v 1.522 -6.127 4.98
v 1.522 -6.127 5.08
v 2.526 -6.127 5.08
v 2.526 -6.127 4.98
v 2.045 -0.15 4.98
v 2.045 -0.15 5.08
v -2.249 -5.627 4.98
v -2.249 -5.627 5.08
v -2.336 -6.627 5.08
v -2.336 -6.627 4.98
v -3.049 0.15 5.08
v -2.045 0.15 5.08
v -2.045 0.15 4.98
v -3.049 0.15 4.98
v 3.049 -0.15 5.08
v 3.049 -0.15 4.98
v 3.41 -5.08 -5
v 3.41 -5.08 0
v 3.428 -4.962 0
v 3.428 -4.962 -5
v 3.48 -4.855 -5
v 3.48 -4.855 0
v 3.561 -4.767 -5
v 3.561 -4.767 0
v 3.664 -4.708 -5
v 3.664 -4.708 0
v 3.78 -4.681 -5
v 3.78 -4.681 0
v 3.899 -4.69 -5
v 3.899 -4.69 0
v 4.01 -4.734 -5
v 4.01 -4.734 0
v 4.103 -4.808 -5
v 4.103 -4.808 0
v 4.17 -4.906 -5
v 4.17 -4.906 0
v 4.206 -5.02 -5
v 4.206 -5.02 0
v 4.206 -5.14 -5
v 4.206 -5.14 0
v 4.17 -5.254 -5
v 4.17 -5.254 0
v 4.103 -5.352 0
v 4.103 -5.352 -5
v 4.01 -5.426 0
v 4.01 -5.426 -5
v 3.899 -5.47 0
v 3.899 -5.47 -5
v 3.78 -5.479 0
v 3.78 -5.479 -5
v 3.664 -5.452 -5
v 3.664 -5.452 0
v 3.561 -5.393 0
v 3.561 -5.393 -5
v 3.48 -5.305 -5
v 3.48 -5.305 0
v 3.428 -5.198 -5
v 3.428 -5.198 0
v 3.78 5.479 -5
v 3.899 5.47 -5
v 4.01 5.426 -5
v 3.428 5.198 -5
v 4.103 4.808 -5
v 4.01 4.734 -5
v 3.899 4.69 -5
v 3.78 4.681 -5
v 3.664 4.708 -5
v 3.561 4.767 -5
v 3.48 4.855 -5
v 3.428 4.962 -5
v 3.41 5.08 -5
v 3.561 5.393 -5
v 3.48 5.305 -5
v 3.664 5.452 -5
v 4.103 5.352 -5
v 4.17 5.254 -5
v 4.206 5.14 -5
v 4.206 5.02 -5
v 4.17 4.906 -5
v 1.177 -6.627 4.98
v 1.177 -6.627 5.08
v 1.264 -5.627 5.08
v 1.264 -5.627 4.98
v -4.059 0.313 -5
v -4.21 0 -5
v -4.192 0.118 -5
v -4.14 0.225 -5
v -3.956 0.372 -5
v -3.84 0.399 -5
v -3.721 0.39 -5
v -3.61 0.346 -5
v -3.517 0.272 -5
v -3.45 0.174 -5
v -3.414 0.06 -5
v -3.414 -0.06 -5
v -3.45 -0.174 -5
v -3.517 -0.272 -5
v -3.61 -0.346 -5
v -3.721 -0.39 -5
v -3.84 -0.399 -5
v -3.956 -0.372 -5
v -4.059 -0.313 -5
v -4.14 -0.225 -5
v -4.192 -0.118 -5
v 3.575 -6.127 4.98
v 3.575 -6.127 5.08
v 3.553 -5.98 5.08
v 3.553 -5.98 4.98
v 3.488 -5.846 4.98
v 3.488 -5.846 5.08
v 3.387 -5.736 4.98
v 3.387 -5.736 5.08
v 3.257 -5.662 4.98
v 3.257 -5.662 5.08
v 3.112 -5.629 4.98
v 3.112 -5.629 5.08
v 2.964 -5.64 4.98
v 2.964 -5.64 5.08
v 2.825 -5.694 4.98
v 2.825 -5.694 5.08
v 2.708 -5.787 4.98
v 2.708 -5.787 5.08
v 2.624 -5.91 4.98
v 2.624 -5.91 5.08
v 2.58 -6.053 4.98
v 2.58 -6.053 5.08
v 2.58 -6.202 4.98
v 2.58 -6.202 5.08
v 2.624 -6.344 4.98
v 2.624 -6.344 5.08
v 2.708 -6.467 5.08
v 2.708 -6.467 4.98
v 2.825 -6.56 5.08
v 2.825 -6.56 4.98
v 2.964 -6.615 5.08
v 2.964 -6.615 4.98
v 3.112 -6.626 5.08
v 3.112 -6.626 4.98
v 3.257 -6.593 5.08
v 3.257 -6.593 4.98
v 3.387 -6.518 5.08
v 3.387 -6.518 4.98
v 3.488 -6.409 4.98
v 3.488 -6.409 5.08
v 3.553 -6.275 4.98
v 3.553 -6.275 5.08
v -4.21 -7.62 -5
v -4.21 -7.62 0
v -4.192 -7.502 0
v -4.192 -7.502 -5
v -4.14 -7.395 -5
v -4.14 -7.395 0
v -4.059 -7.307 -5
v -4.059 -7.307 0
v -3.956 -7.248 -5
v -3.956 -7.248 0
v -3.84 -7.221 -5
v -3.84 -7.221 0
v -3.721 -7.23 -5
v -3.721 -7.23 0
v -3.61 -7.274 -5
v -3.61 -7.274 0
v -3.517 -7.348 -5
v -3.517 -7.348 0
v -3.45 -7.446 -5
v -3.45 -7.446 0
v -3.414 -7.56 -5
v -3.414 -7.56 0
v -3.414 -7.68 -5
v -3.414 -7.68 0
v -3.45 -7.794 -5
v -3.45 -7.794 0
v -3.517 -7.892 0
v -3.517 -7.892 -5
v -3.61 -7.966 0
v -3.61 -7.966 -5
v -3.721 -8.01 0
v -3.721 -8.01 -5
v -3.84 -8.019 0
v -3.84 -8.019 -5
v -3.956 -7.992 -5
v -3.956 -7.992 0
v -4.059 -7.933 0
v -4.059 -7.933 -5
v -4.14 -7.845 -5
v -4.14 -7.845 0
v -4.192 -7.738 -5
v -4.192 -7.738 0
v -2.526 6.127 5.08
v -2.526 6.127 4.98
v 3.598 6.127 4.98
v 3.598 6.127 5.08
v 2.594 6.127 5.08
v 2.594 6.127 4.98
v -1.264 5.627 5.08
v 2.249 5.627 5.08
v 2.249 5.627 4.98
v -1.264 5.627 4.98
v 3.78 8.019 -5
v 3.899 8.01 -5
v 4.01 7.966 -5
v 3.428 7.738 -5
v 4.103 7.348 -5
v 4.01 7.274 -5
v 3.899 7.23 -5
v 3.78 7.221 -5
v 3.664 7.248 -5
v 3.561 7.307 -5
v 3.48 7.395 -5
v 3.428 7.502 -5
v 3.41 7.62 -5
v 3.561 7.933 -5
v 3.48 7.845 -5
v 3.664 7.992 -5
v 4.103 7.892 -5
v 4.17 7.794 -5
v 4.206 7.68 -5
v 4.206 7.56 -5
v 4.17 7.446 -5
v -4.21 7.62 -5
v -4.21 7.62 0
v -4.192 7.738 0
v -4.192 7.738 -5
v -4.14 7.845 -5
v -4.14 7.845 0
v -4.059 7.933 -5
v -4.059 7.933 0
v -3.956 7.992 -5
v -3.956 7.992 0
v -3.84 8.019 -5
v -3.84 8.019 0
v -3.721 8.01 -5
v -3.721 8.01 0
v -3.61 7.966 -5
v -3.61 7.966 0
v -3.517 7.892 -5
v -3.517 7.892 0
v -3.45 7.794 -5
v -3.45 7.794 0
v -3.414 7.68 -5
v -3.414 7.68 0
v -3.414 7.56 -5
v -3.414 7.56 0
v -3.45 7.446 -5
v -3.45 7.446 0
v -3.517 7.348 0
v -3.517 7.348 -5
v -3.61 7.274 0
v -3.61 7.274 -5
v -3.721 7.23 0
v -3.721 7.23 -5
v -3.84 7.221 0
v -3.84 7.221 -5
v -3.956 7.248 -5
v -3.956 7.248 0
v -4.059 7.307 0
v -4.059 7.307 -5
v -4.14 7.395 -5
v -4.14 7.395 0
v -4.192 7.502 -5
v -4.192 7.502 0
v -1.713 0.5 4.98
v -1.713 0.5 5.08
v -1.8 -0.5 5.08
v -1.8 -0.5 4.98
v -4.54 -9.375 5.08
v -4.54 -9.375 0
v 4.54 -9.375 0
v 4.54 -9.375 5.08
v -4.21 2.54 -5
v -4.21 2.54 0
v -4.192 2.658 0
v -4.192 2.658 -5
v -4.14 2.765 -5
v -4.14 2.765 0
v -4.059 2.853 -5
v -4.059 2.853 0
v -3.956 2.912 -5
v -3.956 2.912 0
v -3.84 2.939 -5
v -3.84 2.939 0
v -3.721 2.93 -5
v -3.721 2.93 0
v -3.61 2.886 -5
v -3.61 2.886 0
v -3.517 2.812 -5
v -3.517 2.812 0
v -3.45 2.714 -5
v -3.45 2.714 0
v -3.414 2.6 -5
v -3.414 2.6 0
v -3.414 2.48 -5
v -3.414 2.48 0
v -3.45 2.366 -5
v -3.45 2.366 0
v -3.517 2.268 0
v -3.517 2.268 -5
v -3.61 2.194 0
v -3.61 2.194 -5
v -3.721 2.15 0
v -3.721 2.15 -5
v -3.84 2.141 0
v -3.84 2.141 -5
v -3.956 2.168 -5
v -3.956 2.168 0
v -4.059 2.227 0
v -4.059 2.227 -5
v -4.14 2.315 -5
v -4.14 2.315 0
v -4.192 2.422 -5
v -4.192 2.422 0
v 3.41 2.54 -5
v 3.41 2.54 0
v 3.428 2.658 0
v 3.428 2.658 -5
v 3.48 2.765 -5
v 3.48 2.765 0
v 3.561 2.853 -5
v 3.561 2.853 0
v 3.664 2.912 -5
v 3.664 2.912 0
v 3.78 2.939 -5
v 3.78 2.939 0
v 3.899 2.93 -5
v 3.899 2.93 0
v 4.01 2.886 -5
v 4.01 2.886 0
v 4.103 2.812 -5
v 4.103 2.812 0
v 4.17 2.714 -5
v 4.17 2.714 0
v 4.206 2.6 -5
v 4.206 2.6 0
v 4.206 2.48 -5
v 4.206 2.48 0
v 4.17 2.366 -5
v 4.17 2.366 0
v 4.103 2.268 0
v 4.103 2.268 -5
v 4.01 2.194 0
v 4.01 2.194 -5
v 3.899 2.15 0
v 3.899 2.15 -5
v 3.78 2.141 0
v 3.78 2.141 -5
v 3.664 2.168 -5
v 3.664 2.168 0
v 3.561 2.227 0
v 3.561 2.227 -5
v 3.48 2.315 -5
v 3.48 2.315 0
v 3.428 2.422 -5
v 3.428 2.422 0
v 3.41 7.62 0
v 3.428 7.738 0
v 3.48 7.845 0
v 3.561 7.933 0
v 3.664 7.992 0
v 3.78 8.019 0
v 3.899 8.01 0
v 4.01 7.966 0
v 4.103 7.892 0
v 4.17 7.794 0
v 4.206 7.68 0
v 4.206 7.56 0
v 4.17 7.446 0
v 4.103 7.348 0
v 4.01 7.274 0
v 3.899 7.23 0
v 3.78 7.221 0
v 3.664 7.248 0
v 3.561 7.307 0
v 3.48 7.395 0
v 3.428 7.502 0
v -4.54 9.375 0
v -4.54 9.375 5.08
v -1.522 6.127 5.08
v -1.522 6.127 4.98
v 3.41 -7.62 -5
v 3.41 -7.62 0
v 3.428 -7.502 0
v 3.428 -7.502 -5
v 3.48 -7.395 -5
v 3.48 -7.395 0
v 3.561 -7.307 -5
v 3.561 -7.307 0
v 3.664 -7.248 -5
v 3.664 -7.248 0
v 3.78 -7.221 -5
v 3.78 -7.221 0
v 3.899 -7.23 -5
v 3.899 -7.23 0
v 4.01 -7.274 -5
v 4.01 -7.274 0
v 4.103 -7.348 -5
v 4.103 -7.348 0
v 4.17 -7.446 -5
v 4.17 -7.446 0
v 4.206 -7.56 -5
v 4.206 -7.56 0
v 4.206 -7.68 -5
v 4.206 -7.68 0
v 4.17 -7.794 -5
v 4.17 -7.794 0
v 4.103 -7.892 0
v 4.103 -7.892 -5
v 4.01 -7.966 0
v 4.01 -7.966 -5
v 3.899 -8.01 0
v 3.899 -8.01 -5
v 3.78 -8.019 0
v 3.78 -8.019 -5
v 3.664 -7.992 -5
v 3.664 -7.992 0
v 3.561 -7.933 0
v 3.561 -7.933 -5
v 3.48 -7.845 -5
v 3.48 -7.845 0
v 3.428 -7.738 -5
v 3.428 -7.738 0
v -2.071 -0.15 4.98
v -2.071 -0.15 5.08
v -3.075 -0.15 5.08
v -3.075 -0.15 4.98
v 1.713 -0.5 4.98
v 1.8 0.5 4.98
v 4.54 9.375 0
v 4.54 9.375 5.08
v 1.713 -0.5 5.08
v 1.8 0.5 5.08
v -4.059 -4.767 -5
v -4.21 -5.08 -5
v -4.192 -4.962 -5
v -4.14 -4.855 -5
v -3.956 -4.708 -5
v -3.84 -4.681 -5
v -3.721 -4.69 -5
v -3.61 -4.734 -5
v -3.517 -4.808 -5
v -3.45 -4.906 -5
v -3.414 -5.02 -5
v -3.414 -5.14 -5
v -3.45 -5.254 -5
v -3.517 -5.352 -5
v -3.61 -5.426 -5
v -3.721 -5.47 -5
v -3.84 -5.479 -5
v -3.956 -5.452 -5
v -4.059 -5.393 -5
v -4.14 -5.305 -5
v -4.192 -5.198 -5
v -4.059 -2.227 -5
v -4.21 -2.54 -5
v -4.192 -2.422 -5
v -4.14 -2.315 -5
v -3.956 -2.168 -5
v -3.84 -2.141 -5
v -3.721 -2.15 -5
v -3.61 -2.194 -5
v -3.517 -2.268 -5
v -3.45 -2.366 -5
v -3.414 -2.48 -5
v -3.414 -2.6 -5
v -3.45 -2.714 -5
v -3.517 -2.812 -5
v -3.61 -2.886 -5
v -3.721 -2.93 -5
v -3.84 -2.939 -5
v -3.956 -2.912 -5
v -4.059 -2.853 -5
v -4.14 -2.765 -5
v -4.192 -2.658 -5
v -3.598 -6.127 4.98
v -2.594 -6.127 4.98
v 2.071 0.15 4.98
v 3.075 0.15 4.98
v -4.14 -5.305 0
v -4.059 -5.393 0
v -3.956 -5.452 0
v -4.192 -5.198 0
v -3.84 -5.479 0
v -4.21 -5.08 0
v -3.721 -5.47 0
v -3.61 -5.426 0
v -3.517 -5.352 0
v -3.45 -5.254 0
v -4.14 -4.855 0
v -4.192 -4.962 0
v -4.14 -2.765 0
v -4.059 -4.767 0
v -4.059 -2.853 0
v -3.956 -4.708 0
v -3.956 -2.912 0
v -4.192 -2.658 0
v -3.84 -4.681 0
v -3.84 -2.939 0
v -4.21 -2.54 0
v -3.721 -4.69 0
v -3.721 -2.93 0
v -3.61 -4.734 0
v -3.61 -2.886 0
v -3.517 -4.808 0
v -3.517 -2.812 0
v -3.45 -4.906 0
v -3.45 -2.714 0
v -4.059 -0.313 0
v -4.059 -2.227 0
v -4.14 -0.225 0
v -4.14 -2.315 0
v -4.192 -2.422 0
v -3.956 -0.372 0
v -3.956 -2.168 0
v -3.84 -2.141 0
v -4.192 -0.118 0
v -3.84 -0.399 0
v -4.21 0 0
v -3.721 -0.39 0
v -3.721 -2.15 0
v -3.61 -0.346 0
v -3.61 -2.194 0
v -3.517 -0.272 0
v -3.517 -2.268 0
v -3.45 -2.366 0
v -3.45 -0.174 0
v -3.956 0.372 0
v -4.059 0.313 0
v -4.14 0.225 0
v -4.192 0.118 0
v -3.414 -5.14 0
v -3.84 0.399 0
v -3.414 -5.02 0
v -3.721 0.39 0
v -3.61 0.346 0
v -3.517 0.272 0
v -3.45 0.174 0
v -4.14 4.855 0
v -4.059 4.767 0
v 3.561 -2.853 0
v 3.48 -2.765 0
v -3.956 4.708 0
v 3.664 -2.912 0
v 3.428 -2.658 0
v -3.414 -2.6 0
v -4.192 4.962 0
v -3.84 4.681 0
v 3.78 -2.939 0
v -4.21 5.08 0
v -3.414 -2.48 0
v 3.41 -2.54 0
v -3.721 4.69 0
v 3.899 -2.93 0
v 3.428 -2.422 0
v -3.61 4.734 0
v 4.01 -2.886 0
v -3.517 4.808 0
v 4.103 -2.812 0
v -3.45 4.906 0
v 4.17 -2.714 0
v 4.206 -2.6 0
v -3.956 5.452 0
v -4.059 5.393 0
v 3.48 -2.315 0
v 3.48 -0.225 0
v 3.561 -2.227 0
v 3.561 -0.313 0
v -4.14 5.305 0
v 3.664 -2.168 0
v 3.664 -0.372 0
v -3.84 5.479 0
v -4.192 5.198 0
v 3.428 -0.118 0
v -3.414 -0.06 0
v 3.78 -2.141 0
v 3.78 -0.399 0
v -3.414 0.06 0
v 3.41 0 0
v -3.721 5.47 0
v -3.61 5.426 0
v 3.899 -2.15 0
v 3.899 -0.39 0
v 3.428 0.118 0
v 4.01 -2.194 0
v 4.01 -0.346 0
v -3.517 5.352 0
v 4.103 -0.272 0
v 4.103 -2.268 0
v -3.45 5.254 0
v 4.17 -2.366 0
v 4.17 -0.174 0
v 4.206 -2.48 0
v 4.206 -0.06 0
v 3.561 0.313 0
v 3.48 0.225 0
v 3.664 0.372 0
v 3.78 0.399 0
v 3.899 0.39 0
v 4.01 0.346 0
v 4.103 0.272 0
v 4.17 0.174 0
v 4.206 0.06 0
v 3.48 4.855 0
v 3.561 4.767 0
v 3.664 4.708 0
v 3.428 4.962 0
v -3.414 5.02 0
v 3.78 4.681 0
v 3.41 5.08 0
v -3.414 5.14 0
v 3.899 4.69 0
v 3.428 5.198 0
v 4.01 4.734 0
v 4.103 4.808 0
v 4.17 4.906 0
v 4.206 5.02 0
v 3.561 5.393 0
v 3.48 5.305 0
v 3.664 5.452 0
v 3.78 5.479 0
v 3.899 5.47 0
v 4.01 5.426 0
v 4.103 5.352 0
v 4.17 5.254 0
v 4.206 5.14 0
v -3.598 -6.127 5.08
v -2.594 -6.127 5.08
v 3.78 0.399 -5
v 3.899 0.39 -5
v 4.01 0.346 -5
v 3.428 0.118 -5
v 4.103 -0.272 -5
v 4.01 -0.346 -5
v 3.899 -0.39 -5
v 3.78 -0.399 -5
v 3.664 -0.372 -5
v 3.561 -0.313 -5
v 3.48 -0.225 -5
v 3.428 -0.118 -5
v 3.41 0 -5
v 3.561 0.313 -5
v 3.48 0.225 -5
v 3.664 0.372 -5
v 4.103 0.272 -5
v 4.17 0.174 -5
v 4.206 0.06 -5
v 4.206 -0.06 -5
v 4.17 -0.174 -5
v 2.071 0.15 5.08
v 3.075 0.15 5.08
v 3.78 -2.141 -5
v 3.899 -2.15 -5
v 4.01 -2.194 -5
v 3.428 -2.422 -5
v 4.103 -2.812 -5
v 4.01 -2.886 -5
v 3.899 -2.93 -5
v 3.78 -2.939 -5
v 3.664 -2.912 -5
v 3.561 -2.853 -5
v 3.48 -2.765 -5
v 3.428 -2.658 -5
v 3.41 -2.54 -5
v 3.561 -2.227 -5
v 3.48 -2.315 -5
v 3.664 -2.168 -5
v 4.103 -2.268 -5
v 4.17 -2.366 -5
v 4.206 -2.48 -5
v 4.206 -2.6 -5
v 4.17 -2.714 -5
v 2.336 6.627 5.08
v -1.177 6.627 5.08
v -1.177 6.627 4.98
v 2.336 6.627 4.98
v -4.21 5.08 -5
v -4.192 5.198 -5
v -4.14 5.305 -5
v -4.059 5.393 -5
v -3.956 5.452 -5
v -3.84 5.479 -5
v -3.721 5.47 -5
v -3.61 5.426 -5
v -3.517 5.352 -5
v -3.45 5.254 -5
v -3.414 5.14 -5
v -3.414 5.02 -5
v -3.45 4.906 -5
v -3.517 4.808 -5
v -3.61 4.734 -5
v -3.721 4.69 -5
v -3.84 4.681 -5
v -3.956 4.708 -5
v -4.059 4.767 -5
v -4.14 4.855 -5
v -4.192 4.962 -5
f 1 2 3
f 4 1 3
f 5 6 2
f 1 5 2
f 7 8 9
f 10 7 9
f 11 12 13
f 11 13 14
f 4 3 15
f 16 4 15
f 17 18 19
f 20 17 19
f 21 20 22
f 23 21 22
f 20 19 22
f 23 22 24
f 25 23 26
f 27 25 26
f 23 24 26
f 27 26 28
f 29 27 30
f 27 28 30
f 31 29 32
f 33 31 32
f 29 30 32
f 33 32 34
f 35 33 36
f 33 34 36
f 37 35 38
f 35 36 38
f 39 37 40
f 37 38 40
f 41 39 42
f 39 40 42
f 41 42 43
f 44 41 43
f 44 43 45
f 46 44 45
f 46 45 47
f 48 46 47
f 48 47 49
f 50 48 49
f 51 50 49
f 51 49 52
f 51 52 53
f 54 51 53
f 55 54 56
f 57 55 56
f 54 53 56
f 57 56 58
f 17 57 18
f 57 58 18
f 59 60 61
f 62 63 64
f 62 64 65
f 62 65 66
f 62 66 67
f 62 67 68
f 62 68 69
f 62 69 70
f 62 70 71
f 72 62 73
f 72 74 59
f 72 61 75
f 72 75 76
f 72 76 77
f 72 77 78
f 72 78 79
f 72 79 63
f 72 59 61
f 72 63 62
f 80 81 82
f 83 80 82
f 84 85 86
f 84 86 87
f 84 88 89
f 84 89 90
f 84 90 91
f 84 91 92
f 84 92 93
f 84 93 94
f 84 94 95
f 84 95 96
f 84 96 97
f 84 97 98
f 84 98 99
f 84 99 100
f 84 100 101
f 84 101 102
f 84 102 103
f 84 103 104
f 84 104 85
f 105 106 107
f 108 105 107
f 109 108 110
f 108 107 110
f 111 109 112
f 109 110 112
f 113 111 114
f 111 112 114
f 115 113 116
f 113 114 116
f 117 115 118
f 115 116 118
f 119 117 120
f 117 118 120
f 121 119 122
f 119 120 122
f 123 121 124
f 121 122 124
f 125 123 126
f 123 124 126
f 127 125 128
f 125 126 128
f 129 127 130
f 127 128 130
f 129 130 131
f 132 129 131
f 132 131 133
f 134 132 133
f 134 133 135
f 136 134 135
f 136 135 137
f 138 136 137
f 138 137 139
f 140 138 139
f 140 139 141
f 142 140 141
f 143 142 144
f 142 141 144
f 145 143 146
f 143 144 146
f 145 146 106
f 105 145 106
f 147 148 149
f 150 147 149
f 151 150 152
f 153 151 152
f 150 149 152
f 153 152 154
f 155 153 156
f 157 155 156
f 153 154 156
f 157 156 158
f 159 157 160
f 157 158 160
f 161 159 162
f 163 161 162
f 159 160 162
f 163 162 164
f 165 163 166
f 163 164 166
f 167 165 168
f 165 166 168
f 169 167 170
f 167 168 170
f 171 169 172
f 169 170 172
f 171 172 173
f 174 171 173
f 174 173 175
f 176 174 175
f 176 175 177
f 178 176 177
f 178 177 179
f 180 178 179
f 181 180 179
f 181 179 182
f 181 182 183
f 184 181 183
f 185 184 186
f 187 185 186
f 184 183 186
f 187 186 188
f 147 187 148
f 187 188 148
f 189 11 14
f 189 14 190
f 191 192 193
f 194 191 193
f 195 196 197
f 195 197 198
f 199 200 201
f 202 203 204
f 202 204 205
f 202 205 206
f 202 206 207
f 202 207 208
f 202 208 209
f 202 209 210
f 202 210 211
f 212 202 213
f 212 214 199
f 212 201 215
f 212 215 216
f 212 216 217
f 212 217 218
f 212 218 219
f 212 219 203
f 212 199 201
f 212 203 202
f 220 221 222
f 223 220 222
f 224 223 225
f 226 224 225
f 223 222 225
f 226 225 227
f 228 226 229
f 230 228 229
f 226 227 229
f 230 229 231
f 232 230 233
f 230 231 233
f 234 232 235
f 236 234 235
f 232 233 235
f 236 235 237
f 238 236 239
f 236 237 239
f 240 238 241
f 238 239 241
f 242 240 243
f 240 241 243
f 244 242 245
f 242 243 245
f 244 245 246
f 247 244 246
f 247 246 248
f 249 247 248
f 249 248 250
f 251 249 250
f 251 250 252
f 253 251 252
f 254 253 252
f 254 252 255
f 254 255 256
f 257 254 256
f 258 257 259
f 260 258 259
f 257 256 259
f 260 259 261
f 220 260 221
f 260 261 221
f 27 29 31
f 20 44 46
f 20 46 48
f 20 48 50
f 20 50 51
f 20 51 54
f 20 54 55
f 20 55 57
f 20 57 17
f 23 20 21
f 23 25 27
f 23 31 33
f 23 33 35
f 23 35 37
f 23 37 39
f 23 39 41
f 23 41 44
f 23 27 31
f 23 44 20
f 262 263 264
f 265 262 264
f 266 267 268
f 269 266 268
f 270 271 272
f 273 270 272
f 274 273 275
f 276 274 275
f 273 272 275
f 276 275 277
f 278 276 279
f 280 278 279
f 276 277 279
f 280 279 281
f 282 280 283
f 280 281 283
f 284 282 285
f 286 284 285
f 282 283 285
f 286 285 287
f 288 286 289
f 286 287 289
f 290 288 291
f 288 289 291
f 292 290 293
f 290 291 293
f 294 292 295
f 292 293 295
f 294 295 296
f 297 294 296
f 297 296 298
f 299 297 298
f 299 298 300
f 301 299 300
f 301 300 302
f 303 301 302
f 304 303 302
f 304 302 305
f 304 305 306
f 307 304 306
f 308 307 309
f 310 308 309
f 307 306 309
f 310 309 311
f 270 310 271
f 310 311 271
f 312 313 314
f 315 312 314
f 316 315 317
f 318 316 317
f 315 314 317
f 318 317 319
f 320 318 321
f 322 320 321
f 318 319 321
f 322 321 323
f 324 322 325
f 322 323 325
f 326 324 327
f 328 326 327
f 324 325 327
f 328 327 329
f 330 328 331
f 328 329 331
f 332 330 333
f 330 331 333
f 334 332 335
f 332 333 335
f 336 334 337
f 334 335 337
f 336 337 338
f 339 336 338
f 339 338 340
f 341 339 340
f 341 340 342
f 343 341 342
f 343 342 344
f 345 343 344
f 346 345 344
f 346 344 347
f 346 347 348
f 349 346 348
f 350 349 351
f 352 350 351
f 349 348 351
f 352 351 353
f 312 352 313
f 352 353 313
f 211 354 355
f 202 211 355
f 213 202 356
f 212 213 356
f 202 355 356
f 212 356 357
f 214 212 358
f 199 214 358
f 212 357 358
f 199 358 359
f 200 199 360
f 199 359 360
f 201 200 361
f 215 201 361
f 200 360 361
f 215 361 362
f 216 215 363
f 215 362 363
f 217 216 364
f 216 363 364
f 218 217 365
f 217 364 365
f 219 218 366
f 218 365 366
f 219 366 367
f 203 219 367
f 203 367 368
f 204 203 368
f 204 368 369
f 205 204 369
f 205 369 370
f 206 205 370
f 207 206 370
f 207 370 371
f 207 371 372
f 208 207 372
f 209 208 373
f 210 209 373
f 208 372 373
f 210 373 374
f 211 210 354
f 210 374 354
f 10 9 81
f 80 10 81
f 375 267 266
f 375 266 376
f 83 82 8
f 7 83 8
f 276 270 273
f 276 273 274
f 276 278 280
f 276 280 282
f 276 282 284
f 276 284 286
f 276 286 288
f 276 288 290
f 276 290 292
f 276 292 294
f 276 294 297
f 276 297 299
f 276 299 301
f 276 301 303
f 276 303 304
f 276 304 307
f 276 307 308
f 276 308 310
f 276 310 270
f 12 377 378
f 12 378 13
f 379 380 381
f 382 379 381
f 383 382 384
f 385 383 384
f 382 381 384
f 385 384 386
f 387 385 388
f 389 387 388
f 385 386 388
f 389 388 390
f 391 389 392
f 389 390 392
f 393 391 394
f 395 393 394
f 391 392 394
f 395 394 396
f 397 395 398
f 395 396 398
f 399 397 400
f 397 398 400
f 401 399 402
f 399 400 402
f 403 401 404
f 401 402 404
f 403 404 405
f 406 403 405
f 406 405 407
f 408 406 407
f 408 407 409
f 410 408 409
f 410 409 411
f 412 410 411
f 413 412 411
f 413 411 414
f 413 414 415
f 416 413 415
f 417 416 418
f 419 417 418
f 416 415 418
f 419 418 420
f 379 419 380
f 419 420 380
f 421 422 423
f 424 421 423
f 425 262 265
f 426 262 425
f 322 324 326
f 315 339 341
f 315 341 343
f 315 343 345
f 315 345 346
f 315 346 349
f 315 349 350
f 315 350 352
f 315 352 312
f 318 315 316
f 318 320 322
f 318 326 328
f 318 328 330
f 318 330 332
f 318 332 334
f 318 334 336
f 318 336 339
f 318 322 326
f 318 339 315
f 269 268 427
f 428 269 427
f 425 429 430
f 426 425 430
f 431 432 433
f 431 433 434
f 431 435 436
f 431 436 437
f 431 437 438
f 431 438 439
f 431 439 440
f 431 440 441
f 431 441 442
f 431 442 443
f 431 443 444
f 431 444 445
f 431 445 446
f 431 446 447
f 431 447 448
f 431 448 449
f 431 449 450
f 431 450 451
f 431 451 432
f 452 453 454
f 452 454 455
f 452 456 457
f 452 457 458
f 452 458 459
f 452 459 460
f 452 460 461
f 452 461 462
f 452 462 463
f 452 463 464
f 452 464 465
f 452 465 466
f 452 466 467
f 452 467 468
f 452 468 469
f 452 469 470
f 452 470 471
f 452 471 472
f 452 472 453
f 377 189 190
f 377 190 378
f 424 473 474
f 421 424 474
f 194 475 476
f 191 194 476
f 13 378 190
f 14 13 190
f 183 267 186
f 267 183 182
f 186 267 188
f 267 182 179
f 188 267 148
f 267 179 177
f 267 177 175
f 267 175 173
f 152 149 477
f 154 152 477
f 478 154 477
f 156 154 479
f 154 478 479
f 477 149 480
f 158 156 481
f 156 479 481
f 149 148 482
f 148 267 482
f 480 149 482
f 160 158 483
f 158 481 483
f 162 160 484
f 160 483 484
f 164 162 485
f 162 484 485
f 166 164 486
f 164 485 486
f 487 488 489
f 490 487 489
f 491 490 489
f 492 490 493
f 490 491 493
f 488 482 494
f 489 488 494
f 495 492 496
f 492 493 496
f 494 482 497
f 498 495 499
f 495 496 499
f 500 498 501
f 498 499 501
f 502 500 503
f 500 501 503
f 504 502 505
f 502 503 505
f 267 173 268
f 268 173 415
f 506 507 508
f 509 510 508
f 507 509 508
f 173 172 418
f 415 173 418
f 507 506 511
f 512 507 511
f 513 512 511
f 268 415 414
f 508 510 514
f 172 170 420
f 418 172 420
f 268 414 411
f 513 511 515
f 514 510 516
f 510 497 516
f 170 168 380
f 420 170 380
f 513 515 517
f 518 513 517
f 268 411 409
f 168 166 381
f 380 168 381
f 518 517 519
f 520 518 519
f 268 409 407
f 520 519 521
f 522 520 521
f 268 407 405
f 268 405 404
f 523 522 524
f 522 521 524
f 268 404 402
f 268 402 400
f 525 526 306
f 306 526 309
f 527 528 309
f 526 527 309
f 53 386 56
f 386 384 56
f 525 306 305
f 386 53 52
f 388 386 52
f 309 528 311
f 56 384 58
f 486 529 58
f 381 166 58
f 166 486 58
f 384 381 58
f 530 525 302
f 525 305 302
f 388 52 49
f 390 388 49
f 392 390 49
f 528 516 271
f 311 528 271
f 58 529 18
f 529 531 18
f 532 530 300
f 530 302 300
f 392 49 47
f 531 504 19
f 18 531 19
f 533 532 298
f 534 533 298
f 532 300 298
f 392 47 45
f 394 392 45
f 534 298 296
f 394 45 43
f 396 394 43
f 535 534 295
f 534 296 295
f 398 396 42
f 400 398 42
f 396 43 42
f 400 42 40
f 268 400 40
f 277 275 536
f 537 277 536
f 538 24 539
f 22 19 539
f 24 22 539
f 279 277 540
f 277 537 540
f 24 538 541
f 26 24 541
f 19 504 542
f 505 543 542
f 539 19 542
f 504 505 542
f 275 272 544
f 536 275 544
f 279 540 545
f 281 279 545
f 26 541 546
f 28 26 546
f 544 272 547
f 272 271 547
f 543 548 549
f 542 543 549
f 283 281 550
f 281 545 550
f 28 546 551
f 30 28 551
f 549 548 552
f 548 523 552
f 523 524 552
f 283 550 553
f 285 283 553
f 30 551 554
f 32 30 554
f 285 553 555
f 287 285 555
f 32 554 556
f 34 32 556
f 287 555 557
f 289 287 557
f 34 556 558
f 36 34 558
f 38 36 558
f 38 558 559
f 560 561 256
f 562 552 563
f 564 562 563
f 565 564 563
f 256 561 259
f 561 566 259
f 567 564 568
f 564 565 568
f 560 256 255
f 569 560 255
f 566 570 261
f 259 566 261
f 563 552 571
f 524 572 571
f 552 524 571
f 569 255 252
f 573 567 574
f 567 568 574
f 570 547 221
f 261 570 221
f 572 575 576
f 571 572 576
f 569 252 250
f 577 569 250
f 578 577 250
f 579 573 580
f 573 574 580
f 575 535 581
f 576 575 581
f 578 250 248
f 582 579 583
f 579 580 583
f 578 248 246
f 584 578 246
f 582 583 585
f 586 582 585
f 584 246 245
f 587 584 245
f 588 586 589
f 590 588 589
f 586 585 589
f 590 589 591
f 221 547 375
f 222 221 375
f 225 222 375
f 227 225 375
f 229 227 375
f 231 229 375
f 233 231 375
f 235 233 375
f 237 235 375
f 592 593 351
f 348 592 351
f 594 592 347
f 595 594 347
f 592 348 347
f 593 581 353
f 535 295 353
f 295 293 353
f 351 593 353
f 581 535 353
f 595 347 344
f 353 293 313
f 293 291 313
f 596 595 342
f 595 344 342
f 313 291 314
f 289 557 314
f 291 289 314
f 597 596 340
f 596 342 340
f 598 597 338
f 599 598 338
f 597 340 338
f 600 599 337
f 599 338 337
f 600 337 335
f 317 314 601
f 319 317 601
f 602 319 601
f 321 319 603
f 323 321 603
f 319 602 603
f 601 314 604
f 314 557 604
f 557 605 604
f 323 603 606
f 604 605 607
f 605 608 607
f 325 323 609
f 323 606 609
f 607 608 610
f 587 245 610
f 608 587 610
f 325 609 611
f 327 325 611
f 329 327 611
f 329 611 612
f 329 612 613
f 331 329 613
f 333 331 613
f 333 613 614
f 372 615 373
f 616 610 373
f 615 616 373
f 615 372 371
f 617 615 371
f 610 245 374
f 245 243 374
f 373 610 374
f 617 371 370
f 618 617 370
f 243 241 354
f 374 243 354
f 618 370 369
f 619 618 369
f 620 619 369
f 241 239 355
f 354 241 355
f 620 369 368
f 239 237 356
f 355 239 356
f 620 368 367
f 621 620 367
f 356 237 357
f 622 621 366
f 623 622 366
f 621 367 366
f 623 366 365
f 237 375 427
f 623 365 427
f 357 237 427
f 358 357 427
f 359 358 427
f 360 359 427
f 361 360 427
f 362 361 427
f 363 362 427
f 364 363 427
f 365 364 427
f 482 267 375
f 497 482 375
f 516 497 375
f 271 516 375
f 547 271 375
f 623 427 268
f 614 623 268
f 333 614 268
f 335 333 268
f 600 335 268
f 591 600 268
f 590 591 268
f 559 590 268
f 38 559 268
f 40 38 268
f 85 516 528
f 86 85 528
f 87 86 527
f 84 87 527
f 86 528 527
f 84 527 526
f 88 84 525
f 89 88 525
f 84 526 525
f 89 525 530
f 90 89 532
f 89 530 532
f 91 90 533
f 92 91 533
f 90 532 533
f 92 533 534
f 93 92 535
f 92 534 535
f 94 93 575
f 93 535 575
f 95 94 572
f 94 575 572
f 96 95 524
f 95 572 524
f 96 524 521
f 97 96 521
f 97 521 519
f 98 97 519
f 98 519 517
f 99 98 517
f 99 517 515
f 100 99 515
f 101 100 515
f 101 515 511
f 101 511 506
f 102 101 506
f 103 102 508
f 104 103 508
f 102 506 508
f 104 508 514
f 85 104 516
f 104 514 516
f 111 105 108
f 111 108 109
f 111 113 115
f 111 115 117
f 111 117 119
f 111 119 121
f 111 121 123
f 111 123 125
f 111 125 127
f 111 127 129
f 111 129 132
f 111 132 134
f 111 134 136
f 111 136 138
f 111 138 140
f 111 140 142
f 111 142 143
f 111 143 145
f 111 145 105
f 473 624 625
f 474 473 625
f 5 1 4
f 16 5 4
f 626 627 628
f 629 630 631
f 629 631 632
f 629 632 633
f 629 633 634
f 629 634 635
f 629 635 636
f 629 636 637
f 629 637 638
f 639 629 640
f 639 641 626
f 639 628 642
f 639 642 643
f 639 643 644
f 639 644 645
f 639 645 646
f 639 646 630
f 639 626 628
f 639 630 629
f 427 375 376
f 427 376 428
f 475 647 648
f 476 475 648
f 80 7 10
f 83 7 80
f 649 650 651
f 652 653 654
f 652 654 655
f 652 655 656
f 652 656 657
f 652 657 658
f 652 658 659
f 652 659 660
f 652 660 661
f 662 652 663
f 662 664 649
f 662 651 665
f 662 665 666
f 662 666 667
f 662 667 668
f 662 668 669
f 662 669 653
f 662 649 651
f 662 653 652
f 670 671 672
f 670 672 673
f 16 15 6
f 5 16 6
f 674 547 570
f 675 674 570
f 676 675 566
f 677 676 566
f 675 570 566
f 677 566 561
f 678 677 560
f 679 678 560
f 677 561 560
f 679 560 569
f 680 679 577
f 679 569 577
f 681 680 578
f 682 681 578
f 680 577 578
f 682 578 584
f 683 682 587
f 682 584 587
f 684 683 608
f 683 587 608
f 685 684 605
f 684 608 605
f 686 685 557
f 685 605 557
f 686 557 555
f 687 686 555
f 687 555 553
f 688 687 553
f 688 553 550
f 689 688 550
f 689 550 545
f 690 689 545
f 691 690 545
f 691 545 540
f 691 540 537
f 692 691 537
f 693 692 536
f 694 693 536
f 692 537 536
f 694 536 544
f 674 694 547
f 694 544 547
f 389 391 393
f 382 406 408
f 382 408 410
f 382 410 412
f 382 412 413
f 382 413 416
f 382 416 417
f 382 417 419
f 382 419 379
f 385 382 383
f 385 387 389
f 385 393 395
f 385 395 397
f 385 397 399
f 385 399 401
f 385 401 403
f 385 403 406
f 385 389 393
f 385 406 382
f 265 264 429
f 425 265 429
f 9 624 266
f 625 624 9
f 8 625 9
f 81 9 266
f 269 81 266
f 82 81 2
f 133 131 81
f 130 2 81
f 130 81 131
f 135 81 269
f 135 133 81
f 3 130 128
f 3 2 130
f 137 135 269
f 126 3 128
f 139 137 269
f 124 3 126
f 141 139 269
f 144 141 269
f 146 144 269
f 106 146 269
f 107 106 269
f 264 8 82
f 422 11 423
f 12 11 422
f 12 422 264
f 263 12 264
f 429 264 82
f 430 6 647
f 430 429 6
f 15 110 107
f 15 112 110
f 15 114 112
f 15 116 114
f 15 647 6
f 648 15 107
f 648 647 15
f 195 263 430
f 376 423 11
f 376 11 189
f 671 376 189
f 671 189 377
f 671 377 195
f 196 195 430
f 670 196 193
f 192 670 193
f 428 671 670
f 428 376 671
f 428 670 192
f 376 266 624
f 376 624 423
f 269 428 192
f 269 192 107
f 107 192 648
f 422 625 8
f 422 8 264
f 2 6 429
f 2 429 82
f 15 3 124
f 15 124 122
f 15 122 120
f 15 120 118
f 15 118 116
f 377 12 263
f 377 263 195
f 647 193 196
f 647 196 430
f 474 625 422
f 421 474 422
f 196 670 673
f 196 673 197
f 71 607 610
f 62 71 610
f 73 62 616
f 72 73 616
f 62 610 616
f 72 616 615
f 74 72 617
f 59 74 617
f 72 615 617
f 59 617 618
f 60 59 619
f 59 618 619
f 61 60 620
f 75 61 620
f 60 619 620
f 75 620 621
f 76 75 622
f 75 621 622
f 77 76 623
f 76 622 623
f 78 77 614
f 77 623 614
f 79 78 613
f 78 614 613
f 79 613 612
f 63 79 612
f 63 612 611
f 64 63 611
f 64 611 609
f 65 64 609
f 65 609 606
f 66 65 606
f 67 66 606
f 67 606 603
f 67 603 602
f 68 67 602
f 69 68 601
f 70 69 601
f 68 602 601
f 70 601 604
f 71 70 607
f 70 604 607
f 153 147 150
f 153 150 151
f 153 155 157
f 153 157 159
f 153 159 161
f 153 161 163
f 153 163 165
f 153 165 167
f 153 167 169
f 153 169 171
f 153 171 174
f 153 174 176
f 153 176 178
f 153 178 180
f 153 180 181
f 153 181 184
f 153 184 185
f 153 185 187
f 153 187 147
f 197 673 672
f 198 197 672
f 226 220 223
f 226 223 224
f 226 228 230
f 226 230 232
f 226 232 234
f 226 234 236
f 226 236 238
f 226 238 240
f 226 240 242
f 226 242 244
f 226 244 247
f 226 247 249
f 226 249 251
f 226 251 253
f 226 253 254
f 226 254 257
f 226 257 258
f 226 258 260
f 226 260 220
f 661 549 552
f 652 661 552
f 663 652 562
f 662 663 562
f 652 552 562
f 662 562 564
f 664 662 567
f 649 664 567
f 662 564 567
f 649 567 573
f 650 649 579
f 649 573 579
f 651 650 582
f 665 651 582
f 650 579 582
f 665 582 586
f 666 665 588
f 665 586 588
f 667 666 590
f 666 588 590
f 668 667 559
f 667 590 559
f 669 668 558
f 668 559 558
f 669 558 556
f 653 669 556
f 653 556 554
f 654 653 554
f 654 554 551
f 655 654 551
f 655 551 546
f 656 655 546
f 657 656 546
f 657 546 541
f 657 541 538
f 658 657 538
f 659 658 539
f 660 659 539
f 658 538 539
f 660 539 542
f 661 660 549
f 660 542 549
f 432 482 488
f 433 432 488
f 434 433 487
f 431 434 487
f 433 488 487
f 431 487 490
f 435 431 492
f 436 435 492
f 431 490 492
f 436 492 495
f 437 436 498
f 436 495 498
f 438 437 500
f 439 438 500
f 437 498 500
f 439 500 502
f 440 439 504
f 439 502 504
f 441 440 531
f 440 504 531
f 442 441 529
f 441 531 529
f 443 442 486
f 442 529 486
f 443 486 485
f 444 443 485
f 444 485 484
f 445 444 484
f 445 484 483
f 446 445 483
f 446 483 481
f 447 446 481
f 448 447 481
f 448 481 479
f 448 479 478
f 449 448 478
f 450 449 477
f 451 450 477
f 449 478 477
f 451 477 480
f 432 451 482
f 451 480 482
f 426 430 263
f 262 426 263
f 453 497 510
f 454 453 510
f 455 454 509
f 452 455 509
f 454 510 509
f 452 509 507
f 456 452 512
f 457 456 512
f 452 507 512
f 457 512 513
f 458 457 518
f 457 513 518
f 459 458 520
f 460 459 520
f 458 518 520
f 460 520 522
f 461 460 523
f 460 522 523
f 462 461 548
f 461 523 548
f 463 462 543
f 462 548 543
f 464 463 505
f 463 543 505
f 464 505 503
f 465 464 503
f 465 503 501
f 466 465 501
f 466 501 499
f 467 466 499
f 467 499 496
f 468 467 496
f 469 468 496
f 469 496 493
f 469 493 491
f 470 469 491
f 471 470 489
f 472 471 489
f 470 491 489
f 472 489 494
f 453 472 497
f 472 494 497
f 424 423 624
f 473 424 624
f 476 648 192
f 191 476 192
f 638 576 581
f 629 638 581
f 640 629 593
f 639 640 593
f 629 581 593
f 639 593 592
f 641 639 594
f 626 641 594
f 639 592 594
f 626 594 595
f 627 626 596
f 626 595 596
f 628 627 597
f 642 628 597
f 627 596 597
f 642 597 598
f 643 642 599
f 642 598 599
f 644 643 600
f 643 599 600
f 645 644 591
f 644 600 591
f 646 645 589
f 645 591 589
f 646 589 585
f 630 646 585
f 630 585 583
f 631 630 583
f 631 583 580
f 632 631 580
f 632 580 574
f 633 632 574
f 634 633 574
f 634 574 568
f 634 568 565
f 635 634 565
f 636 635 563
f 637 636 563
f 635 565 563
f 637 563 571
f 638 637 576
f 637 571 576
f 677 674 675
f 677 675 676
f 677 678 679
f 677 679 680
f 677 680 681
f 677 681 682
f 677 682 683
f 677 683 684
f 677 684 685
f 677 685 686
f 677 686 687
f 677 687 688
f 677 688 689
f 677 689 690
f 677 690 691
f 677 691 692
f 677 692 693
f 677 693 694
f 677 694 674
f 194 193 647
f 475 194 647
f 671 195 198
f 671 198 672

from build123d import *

# Parameters (mm, degrees)
SKETCH1_W           = 9.08
SKETCH1_H           = 18.75
BODY_DEPTH          = 5.08
SKETCH2_R           = 0.4
PINS_DEPTH          = 5
PIN_PATTERN_1_COUNT = 4
PIN_PATTERN_1_PITCH = 2.54
PIN_PATTERN_2_COUNT = 4
PIN_PATTERN_2_PITCH = 2.54
SKETCH3_R           = 0.5
LED_DISPLAY_DEPTH   = 0.1


with BuildPart() as part:
    # Sketch1 → Body (new body)
    with BuildSketch(Plane.XY):
        Rectangle(SKETCH1_W, SKETCH1_H)
    extrude(amount=BODY_DEPTH)

    # Sketch2 → Pins (add)
    with BuildSketch(Plane(origin=(0, 0, 0), x_dir=(-1, 0, 0), z_dir=(0, 0, -1))):
        with Locations((-3.81, 0)):
            Circle(SKETCH2_R)
        with Locations((3.81, 0)):
            Circle(SKETCH2_R)
    pins = extrude(amount=PINS_DEPTH)

    # Pin Pattern 1: Pins ×4
    with Locations(*[(0, -i * PIN_PATTERN_1_PITCH, 0) for i in range(1, PIN_PATTERN_1_COUNT)]):
        add(pins)

    # Pin Pattern 2: Pins ×4
    with Locations(*[(0, i * PIN_PATTERN_2_PITCH, 0) for i in range(1, PIN_PATTERN_2_COUNT)]):
        add(pins)

    # Sketch3 → LED Display (cut)
    with BuildSketch(Plane.XY.offset(5.08)):
        with Locations((3.074773804, -6.127168189)):
            Circle(SKETCH3_R)
        Polygon((-1.521772911, 6.127168189), (-2.044707367, 0.15), (-3.048527205, 0.15), (-2.525592748, 6.127168189), align=None)
        Polygon((-3.597708261, -6.127168189), (-2.593888423, -6.127168189), (-2.070953966, -0.15), (-3.074773804, -0.15), align=None)
        Polygon((2.593888423, 6.127168189), (2.070953966, 0.15), (3.074773804, 0.15), (3.597708261, 6.127168189), align=None)
        Polygon((1.521772911, -6.127168189), (2.525592748, -6.127168189), (3.048527205, -0.15), (2.044707367, -0.15), align=None)
        Polygon((-1.712940384, 0.5), (-1.800429047, -0.5), (1.712940384, -0.5), (1.800429047, 0.5), align=None)
        Polygon((-1.264371291, 5.627168189), (-1.176882628, 6.627168189), (2.336486803, 6.627168189), (2.24899814, 5.627168189), align=None)
        Polygon((-2.24899814, -5.627168189), (-2.336486803, -6.627168189), (1.176882628, -6.627168189), (1.264371291, -5.627168189), align=None)
    extrude(amount=-LED_DISPLAY_DEPTH, mode=Mode.SUBTRACT)


solid = part.part
